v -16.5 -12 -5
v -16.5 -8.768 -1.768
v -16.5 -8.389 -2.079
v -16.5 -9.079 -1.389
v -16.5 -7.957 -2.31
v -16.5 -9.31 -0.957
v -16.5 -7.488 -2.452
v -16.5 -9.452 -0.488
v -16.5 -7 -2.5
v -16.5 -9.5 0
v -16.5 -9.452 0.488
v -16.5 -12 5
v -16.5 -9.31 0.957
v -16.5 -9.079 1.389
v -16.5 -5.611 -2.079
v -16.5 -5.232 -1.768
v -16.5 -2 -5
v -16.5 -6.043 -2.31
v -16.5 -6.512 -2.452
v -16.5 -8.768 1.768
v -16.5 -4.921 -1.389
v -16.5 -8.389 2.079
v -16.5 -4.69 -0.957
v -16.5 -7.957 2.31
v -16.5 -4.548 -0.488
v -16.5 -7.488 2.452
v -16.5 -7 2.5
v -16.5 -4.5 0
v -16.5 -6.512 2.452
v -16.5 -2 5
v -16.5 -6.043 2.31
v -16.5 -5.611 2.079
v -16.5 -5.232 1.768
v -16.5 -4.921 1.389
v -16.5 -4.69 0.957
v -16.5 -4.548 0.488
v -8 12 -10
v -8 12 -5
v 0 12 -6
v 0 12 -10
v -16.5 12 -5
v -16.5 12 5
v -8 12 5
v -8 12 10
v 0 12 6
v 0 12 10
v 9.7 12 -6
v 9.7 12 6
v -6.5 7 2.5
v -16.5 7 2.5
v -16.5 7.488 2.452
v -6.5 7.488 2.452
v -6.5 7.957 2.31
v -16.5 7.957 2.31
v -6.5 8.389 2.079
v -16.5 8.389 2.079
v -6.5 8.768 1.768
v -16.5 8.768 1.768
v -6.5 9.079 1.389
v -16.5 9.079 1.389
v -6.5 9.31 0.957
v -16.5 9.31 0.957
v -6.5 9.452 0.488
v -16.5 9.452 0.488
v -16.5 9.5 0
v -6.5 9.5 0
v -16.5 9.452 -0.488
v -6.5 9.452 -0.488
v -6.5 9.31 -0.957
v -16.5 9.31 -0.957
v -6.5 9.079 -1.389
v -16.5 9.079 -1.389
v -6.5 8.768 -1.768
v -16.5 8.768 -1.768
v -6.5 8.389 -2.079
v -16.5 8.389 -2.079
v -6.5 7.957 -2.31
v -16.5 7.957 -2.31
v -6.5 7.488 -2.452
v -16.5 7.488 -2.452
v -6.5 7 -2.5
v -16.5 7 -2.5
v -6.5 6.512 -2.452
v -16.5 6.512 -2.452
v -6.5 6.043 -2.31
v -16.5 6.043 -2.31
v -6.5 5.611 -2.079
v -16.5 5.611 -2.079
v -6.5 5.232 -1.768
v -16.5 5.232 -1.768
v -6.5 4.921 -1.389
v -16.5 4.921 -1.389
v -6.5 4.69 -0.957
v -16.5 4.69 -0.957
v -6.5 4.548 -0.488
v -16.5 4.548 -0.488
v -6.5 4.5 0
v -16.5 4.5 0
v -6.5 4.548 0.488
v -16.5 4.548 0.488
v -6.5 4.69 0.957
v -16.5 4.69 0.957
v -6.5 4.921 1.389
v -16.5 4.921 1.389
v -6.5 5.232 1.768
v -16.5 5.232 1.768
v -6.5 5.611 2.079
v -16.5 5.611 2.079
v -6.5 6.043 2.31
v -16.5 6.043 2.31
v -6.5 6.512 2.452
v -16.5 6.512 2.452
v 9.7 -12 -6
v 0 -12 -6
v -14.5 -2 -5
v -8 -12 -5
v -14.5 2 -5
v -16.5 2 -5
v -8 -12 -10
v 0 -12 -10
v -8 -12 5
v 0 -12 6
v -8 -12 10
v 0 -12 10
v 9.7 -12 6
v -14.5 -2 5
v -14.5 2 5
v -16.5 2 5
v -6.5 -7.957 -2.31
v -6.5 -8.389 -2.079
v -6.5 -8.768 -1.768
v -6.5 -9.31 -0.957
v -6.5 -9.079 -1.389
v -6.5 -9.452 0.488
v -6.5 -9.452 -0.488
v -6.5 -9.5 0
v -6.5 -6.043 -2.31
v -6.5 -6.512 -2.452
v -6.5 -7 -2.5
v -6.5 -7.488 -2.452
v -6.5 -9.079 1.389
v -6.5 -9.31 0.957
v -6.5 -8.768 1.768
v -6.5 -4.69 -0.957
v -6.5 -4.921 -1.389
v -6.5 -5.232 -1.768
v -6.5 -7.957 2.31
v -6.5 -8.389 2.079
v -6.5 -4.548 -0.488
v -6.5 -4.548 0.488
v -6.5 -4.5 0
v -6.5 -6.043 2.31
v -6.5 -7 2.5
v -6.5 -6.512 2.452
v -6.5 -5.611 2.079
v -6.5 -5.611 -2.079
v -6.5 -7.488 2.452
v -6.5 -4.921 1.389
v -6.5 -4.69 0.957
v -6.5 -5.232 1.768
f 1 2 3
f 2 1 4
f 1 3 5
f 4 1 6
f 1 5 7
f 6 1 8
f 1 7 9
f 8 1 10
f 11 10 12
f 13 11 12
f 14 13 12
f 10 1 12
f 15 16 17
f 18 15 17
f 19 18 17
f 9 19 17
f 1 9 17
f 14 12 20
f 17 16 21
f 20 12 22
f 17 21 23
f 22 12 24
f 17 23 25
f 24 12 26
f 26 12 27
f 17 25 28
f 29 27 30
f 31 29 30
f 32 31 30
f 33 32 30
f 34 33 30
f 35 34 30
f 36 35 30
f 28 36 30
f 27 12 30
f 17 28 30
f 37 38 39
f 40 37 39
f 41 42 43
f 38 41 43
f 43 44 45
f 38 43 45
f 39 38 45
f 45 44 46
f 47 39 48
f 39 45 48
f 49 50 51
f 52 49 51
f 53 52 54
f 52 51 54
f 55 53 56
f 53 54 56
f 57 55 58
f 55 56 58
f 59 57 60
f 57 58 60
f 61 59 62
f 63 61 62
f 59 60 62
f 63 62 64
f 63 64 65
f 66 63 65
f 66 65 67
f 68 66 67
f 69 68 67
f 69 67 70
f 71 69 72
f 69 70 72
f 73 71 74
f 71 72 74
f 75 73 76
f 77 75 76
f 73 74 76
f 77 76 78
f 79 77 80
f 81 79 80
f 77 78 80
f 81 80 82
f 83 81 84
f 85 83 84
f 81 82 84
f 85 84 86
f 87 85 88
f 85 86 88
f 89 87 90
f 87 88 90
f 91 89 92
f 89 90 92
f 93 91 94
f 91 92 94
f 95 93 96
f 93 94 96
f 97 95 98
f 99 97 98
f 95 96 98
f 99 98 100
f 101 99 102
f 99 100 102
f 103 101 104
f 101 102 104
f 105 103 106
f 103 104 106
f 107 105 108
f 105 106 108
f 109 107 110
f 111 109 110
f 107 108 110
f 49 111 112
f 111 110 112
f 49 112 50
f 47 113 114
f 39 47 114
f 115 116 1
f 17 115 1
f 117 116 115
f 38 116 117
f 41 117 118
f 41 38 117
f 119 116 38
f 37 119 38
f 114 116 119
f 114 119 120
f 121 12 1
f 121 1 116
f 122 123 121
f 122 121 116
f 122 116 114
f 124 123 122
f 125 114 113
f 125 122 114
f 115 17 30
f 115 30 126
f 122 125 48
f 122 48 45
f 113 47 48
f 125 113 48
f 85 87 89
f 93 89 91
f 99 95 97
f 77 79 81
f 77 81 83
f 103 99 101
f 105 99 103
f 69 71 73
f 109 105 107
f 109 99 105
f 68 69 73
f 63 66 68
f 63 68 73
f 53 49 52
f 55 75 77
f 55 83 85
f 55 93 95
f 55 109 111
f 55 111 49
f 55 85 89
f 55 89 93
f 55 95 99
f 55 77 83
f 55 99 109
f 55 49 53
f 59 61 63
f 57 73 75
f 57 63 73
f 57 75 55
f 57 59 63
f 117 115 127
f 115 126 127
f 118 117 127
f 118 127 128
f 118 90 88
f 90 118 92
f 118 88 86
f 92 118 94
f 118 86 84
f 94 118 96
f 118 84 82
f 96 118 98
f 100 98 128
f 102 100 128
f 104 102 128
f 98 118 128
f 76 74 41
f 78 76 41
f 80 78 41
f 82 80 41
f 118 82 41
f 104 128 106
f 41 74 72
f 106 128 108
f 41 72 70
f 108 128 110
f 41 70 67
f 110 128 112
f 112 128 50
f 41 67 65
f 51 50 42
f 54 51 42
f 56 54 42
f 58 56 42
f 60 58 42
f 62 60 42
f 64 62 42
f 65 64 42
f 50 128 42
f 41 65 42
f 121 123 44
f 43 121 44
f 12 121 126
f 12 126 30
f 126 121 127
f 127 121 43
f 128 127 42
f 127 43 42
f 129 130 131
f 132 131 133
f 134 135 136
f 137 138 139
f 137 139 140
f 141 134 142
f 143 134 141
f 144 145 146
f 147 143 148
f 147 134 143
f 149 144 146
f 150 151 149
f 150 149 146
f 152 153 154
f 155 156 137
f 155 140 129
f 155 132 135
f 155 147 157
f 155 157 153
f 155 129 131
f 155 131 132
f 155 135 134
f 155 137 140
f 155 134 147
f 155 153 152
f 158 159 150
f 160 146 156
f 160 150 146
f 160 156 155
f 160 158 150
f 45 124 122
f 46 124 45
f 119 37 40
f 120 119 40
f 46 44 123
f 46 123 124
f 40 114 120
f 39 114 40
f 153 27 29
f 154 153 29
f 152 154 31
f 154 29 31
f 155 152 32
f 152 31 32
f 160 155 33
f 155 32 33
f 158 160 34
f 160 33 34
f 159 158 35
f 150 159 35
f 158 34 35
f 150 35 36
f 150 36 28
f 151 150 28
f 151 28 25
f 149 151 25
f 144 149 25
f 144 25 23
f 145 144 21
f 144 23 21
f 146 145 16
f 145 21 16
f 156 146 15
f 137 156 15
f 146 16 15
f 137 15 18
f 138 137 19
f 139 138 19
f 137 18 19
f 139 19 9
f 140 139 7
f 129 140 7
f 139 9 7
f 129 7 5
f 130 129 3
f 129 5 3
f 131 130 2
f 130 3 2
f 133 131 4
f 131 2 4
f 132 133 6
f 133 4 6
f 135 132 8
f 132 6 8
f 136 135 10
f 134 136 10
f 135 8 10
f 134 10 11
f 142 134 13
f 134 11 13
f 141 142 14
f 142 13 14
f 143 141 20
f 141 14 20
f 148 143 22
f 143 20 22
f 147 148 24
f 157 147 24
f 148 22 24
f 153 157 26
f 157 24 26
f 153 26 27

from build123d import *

# Parameters (mm, degrees)
BODY1_DEPTH    = 5
BODY2_SKETCH_W = 8
BODY2_SKETCH_H = 24
BODY2_DEPTH    = 10
CUT_SKETCH_R   = 2.5
CUT_DEPTH      = 10
SKETCH2_W      = 9.7
SKETCH2_H      = 12
L_DETAIL_DEPTH = 24


with BuildPart() as part:
    # Body1_Sketch → Body1 (new body, symmetric)
    with BuildSketch(Plane.XY):
        Polygon((-16.5, -12), (-16.5, -2), (-14.5, -2), (-14.5, 2), (-16.5, 2), (-16.5, 12), (0, 12), (0, -12), align=None)
    extrude(amount=BODY1_DEPTH, both=True)

    # Body2_Sketch → Body2 (add, symmetric)
    with BuildSketch(Plane.XY):
        with Locations((-4, 0)):
            Rectangle(BODY2_SKETCH_W, BODY2_SKETCH_H)
    extrude(amount=BODY2_DEPTH, both=True)

    # Cut_Sketch → Cut (cut)
    with BuildSketch(Plane.ZY.offset(16.5)):
        with Locations((0, 7)):
            Circle(CUT_SKETCH_R)
        with Locations((0, -7)):
            Circle(CUT_SKETCH_R)
    extrude(amount=-CUT_DEPTH, mode=Mode.SUBTRACT)

    # Sketch2 → L-Detail (add)
    with BuildSketch(Plane(origin=(0, 12, 0), x_dir=(-1, 0, 0), z_dir=(0, 1, 0))):
        with Locations((-4.85, 0)):
            Rectangle(SKETCH2_W, SKETCH2_H)
    extrude(amount=-L_DETAIL_DEPTH)


solid = part.part
